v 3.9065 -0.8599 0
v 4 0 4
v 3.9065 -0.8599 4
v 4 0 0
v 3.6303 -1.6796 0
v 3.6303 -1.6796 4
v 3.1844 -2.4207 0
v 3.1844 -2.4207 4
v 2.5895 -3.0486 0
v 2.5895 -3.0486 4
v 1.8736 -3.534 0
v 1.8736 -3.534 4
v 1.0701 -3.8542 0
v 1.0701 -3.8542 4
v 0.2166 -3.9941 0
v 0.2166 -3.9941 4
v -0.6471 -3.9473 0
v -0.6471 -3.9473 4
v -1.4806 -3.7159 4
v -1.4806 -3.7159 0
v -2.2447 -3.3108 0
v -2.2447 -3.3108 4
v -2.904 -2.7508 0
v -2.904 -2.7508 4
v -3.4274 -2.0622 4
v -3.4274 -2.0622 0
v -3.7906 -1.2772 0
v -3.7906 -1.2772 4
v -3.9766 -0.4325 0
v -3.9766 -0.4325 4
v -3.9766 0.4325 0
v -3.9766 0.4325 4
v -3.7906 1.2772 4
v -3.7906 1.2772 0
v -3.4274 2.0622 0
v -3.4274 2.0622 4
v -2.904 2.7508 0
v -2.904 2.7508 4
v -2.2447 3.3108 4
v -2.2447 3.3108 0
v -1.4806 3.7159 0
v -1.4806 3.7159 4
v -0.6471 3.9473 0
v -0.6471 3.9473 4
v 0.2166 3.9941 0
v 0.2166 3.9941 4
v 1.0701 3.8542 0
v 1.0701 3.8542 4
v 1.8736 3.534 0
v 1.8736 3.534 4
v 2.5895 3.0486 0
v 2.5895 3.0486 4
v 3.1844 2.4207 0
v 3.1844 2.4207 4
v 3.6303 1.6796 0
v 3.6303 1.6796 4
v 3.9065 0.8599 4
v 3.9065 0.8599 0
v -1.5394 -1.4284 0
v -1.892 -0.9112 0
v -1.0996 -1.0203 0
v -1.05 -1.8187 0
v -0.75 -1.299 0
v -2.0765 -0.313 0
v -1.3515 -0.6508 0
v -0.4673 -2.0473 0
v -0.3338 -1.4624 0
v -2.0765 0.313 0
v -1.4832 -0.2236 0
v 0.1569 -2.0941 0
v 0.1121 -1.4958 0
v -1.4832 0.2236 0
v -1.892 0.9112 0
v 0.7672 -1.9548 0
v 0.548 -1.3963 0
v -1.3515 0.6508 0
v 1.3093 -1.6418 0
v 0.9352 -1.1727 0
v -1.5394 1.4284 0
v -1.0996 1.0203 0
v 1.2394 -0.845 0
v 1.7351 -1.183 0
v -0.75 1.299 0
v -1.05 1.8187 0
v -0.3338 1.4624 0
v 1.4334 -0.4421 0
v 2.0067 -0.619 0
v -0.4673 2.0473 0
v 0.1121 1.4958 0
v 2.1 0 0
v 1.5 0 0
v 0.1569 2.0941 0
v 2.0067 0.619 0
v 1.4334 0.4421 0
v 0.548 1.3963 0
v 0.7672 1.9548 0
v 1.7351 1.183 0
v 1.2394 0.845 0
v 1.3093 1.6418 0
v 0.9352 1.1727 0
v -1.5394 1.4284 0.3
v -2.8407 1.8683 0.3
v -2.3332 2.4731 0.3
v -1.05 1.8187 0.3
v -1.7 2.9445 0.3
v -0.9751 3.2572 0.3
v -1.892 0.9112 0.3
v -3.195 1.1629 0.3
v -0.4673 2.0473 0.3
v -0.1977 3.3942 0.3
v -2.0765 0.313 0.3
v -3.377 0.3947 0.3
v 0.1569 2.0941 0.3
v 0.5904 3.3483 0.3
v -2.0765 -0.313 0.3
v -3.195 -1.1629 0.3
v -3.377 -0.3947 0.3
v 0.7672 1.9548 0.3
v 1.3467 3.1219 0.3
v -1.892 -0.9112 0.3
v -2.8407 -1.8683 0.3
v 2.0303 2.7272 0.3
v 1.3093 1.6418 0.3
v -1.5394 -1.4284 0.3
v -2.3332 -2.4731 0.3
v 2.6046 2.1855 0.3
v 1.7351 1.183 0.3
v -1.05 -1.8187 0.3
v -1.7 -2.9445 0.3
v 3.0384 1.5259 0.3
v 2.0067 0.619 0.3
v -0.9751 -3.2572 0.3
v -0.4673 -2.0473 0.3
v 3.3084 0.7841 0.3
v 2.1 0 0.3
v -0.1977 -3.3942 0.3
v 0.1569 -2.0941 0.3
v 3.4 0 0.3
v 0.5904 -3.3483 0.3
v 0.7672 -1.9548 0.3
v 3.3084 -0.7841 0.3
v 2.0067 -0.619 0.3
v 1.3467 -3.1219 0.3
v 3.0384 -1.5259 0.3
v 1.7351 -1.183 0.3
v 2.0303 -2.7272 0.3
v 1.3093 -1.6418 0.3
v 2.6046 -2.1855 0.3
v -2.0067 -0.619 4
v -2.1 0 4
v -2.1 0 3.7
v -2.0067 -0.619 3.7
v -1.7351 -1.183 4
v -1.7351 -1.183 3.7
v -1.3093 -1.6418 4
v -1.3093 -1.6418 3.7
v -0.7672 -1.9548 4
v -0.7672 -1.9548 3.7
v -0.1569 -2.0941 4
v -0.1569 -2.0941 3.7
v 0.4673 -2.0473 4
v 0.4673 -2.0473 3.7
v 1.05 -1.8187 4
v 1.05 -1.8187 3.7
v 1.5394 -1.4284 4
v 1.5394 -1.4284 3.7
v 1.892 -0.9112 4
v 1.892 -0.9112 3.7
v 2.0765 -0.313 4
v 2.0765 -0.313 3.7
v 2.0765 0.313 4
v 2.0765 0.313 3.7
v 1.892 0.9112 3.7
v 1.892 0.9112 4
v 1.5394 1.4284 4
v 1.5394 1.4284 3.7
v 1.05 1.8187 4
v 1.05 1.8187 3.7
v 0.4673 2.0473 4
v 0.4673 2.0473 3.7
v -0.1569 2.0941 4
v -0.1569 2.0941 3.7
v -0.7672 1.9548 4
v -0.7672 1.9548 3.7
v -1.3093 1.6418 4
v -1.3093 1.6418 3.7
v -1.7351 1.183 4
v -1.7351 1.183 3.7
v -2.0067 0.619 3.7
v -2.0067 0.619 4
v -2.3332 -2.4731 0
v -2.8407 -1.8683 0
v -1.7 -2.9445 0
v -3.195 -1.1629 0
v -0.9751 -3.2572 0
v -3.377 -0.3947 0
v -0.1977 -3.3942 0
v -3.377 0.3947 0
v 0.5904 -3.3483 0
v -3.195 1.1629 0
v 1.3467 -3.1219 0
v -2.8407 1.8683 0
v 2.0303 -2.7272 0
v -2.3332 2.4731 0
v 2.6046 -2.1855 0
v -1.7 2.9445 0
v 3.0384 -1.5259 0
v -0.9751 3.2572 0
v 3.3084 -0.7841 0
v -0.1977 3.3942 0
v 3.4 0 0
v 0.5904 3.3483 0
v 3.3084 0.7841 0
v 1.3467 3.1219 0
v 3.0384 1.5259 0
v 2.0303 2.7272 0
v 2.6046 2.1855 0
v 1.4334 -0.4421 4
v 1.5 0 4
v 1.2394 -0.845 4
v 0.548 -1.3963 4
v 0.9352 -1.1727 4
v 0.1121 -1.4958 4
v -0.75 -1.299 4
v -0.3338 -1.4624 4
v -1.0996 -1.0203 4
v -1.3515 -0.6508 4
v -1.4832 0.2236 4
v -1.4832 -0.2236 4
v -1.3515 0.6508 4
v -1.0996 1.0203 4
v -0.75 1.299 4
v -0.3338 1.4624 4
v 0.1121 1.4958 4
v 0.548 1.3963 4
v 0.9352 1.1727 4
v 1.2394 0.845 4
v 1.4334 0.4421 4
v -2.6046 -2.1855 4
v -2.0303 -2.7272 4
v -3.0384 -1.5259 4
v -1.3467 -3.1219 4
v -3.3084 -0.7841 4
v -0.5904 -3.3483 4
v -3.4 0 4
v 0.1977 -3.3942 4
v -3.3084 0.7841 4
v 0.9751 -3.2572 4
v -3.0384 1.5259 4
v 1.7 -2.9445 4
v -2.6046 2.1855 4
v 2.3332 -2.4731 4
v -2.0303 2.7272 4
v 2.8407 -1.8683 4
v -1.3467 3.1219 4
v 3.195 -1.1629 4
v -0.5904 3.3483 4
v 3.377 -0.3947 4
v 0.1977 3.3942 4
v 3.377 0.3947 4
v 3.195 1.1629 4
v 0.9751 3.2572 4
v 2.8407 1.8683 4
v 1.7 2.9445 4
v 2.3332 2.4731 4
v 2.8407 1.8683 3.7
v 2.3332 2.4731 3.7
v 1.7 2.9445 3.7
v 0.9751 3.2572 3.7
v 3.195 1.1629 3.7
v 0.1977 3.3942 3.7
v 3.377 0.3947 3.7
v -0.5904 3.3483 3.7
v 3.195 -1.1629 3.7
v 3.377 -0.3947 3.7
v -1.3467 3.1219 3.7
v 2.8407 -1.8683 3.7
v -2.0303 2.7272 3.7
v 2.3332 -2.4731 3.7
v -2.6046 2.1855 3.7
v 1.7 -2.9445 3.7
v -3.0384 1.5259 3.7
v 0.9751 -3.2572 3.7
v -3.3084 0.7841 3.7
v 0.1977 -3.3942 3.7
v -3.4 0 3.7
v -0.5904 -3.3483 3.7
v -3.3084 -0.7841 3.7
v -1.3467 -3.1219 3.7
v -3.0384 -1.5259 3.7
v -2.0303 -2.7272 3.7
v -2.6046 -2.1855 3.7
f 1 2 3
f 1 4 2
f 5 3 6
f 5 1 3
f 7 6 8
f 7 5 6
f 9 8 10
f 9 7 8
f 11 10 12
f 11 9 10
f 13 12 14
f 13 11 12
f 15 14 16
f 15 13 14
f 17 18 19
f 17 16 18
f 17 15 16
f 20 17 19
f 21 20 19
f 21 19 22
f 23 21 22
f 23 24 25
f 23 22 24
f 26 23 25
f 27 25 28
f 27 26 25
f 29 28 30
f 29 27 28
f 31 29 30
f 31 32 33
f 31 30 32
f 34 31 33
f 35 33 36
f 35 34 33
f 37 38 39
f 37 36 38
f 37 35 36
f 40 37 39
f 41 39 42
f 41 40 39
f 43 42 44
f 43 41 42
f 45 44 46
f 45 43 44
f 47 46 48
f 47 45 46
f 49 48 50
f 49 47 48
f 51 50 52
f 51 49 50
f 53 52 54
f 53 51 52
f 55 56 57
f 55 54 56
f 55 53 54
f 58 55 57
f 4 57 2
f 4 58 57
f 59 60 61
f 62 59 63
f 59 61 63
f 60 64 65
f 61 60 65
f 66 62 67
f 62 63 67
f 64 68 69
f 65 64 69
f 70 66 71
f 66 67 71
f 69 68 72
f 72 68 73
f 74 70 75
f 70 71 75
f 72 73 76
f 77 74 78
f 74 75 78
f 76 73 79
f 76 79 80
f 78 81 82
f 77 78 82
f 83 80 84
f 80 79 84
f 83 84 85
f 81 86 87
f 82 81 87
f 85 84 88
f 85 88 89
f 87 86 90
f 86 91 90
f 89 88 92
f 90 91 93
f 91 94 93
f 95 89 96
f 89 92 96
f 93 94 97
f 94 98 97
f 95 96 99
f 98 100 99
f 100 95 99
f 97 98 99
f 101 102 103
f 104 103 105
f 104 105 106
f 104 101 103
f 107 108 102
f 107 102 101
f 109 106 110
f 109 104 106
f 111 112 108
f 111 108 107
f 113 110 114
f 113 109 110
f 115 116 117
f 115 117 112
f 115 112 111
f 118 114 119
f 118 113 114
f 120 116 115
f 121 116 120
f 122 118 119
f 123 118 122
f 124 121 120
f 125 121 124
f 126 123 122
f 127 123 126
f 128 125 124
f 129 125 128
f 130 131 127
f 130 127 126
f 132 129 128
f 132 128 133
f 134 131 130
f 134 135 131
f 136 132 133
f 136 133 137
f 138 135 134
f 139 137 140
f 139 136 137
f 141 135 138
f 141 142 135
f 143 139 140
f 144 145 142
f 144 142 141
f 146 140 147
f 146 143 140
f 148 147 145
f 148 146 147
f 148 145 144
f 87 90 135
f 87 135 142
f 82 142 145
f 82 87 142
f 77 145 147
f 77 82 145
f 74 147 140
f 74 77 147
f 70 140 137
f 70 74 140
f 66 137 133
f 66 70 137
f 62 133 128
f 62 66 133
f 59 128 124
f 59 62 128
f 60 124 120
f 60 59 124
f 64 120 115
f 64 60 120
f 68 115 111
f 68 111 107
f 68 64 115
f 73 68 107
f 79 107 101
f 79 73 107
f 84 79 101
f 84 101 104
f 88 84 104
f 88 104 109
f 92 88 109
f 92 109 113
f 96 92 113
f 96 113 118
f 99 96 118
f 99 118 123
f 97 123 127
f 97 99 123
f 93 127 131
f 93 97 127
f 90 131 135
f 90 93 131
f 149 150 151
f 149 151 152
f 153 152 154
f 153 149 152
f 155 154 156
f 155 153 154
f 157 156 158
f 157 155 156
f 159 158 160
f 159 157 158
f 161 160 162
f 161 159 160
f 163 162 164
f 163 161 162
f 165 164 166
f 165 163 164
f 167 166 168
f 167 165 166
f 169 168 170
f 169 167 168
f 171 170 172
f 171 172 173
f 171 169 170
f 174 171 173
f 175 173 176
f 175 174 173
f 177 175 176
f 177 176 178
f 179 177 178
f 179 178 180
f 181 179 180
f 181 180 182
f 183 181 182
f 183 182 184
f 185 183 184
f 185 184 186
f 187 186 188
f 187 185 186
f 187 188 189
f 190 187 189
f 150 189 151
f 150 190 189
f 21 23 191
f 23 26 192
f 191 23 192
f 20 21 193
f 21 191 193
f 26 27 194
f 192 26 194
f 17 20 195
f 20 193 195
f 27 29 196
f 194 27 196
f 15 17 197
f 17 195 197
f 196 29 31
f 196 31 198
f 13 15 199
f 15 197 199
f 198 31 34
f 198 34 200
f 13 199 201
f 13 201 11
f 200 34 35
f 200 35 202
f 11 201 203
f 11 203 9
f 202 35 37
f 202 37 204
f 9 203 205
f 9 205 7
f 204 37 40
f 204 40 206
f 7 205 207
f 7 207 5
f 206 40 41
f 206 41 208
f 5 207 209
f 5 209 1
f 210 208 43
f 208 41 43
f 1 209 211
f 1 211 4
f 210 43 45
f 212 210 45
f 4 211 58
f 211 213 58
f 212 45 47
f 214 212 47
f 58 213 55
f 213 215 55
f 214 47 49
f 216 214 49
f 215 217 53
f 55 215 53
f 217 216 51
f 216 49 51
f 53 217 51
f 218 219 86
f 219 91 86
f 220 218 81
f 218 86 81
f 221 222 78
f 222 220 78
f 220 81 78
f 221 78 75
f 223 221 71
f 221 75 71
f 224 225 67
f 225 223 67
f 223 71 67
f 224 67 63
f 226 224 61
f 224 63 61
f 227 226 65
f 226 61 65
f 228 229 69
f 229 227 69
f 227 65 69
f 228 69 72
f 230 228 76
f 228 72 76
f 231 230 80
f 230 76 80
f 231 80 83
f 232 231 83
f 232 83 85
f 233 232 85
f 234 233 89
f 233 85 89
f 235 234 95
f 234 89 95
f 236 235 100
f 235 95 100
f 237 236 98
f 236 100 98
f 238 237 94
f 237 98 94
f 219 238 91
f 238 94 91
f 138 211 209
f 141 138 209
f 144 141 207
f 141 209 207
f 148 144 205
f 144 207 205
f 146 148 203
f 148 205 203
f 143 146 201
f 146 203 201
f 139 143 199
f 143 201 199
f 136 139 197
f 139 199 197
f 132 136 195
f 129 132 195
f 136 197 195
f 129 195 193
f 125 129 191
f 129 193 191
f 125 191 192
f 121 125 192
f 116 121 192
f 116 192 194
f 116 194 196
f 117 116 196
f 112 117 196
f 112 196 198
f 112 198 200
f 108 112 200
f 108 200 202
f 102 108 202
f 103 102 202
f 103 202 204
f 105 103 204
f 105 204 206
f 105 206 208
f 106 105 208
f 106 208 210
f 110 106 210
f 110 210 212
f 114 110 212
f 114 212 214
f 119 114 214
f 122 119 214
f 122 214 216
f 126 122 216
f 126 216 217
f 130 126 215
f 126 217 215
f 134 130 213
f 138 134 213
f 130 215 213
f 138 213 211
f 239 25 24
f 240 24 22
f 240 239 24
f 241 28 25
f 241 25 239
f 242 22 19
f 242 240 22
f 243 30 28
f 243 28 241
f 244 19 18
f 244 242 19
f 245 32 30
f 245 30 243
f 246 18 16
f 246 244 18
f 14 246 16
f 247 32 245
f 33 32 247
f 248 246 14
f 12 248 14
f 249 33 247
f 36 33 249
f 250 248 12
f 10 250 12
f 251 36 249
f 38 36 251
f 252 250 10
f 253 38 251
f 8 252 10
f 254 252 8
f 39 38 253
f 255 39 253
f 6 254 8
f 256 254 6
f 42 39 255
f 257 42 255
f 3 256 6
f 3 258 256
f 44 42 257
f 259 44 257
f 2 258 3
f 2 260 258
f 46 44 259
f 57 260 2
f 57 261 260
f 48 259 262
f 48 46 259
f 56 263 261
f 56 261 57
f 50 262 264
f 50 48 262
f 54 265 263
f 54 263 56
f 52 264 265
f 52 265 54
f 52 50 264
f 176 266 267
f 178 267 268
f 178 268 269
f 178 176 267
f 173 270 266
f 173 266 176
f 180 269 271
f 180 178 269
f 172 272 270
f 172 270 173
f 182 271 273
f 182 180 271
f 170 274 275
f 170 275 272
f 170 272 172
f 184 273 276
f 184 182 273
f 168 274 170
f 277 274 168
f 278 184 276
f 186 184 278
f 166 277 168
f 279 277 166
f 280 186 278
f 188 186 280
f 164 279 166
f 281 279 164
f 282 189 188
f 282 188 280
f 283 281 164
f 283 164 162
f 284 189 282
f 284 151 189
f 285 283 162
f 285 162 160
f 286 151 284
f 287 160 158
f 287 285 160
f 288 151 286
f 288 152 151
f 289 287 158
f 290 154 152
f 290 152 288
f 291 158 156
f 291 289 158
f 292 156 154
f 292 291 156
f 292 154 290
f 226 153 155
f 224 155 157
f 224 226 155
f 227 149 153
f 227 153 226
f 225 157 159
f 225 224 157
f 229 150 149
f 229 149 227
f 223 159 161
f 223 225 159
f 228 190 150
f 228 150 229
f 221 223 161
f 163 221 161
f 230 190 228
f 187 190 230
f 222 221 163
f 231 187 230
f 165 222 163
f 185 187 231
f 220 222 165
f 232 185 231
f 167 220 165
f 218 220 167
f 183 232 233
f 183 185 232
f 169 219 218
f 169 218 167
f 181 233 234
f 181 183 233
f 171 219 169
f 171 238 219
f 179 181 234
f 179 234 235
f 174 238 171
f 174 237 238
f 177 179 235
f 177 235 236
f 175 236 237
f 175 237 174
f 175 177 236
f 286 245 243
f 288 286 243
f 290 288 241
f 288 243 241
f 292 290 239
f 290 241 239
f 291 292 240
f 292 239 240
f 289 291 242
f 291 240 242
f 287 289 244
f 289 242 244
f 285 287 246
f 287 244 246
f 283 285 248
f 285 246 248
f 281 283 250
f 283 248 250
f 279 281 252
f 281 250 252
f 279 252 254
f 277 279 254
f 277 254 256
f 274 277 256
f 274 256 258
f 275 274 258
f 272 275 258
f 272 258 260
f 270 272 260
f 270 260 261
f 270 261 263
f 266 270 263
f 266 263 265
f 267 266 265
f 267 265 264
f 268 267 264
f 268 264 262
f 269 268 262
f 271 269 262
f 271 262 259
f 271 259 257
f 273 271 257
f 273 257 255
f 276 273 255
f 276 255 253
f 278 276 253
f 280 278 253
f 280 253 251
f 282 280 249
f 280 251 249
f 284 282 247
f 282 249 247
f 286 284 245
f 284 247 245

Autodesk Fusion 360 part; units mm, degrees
sketch "Sketch1" plane through (0, 0, 0) normal (0, 0, 1) x (1, 0, 0)
  circle A0 centre (0, 0) radius 4
  circle A1 centre (0, 0) radius 1.5
  dimension "d1" = 8
  dimension "d2" = 3
extrude "Extrude1" add sketch "Sketch1" along normal blind 4
sketch "Sketch2" plane through (0, 0, 4) normal (0, 0, 1) x (-1, 0, 0)
  circle A0 centre (0, 0) radius 1.5
  circle A1 centre (0, 0) radius 4
  circle A2 centre (0, 0) radius 3.4
  circle A3 centre (0, 0) radius 2.1
  dimension "d5" = -0.6
  dimension "d6" = 0.6
extrude "Extrude2" cut sketch "Sketch2" against normal blind 0.3 contours A2
sketch "Sketch3" plane through (0, 0, 0) normal (0, 0, -1) x (1, 0, 0)
  circle A0 centre (0, 0) radius 1.5
  circle A1 centre (0, 0) radius 4
  circle A2 centre (0, 0) radius 3.4
  circle A3 centre (0, 0) radius 2.1
  dimension "d9" = -0.6
  dimension "d10" = 0.6
extrude "Extrude3" cut sketch "Sketch3" against normal blind 0.3 contours A2
